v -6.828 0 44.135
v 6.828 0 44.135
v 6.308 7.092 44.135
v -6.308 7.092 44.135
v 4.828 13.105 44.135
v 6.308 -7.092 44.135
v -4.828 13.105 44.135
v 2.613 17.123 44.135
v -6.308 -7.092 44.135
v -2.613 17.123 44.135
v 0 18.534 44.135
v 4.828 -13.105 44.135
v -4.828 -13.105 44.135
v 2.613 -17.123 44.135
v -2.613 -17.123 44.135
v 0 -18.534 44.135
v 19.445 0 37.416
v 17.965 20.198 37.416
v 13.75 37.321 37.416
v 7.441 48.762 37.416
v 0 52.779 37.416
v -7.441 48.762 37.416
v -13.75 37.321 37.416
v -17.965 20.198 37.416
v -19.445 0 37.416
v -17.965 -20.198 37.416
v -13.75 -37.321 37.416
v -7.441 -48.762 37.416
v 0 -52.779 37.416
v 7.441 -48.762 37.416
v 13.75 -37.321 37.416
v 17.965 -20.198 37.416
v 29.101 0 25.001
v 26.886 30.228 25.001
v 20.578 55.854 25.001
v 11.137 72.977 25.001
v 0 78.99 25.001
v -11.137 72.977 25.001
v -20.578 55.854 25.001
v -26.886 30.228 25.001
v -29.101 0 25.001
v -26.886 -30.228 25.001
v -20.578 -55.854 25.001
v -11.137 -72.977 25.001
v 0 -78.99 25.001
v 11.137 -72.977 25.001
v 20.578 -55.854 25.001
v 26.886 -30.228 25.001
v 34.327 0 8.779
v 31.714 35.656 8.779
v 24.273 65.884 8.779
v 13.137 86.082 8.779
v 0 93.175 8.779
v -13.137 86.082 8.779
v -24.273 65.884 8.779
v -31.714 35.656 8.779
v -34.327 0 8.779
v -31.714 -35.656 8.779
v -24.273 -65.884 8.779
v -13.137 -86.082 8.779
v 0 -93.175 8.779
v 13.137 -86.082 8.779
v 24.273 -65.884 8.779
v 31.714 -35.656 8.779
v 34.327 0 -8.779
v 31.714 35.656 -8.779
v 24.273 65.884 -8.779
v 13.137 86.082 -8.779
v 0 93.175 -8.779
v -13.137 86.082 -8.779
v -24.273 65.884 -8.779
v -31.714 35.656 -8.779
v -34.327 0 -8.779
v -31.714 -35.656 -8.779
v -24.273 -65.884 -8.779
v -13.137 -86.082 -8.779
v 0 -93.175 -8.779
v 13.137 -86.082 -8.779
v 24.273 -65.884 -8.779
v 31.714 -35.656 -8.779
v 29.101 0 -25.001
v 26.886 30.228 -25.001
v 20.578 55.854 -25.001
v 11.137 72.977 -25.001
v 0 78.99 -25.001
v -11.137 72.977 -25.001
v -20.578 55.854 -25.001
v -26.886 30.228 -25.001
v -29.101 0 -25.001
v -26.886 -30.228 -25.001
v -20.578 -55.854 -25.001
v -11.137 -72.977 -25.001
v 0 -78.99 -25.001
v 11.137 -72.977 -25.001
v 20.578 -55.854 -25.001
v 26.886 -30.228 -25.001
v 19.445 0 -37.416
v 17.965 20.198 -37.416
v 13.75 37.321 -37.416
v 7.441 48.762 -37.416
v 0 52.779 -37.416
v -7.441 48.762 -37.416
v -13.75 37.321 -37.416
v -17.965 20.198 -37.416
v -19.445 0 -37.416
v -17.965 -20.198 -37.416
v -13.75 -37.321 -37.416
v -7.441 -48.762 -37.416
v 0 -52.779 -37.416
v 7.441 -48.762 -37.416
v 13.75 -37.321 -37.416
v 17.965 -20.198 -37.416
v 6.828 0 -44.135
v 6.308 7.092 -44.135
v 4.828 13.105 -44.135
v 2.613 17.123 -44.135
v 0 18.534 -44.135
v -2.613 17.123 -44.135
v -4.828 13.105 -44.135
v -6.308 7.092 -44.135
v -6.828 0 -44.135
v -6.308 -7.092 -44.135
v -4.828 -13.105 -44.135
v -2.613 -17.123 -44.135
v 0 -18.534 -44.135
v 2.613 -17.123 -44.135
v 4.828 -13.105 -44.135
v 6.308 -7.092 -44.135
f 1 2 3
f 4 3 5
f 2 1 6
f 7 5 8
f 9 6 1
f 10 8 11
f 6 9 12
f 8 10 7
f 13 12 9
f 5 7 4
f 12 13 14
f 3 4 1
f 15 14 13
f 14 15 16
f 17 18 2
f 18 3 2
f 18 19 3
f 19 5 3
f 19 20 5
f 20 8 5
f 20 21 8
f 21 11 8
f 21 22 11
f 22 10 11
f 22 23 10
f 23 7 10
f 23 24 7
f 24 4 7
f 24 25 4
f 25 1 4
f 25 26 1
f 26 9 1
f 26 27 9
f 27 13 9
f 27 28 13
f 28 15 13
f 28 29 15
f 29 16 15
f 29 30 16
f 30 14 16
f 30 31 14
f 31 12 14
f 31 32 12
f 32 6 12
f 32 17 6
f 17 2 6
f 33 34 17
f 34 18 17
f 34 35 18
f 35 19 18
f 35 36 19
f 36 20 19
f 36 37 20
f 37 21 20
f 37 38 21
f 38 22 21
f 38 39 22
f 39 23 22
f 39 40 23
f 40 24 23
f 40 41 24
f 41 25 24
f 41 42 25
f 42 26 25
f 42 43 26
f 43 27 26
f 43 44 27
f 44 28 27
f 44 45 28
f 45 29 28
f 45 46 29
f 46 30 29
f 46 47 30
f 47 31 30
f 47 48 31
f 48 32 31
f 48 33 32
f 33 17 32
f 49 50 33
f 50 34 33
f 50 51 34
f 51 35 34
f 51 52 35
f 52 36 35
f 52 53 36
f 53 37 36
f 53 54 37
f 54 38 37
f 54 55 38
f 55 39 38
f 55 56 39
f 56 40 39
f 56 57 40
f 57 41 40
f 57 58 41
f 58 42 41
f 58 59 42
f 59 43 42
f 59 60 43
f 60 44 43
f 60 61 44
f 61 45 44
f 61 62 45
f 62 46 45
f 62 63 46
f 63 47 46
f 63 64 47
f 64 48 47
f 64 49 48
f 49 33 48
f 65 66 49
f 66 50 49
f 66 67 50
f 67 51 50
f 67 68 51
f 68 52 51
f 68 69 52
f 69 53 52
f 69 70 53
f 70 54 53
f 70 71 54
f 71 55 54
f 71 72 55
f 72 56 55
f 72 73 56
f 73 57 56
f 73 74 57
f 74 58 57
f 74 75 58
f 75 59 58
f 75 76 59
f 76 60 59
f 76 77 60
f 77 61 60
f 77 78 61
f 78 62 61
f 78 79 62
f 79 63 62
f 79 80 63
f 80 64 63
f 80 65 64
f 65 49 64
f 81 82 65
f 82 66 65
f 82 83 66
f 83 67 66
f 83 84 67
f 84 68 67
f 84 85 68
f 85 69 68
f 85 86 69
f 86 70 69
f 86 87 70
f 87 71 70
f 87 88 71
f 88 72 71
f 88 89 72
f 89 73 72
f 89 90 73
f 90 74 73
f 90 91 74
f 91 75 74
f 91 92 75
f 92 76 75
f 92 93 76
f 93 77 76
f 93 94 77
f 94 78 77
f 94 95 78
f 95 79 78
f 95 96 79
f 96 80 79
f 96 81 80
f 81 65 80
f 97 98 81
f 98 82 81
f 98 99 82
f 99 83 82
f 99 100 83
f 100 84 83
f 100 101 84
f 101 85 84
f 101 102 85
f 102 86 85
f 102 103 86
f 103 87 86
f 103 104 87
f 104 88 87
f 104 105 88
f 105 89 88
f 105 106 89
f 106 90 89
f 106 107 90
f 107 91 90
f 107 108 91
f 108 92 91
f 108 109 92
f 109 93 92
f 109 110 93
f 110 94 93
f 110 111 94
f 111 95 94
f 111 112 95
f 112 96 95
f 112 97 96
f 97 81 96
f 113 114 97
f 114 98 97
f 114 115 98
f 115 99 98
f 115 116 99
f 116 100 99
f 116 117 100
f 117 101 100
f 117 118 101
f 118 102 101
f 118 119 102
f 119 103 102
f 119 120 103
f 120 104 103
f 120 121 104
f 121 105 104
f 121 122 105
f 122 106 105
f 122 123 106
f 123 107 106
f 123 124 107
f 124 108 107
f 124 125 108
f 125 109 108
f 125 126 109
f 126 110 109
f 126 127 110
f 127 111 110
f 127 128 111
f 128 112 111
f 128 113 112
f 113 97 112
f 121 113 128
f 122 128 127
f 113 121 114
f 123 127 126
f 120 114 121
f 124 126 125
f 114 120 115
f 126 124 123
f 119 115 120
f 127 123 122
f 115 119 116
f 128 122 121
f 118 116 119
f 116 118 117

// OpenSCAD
// Generated by SolidPython 1.0.1 on 2020-07-29 00:46:48


scale(v = [7, 19, 9]) {
	sphere(r = 5);
}
/***********************************************
*********      SolidPython code:      **********
************************************************
 
# import packages: SolidPython
from solid import *
from solid.utils import *
from itertools import chain, combinations, permutations


class Resize:

    def __init__(self, scad_file):
        self.scad_file = scad_file
        #self.scad_file = import_scad(scad_file)
        # cone/cylinder param:
        self.r1 = 0
        self.r2 = 0
        self.h = 0
        # rectangular prism param:
        self.w = 0
        self.l = 0
        # ellipse param:
        self.r = 0

    # import OpenScad code (file name corresponds to shape)


    # classify shape + parameters
    def assign(self, param1, param2, param3):
        if self.scad_file == 'cone.scad':
            self.r1 = param1
            self.r2 = param2
            self.h = param3
        elif self.scad_file == 'cylinder.scad':
            self.r1 = param1
            self.r2 = param2
            self.h = param3
        elif self.scad_file == 'rectangularPrism.scad':
            self.h = param1
            self.l = param2
            self.w = param3
        else:
            self.r = param1
            self.h = param2

    # resize parameters
    def iterate(self):
        x = range(3, 20, 2)
        i = 1
        if self.scad_file == 'cone.scad':
            tempList = list(permutations(x, 2))
            for temp in tempList:
                param1 = temp[0]
                param2 = temp[1]
                filepath = 'produced_scad_files/' + 'cone' + str(param1) + '_' + str(param2) + '_' + '.scad'
                scad_render_to_file(cylinder(h=param1, r1=param2, r2=0), filepath)

        elif self.scad_file == 'cylinder.scad':
            tempList = list(permutations(x, 3))
            for temp in tempList:
                param1 = temp[0]
                param2 = temp[1]
                filepath = 'produced_scad_files/' + 'cylinder' + str(param1) + '_' + str(param2) + '_' + '.scad'
                scad_render_to_file(cylinder(h=param1, r1=param2, r2=param2), filepath)

        elif self.scad_file == 'rectangularPrism.scad':
            tempList = list(permutations(x, 3))
            for temp in tempList:
                param1 = temp[0]
                param2 = temp[1]
                param3 = temp[2]
                filepath = 'produced_scad_files/' + 'rectangularPrism' + str(param1) + '_' + str(param2) + '_' + str(
                    param3) + '.scad'
                scad_render_to_file(cube(size=(param1, param2, param3)), filepath)

        elif self.scad_file == 'ellipse.scad':
            tempList = list(permutations(x, 4))
            for temp in tempList:
                param1 = temp[0]
                param2 = temp[1]
                param3 = temp[2]
                param4 = temp[3]
                filepath = 'produced_scad_files/' + 'ellipse' + str(param1) + '_' + str(param2) + '_' + str(param3) + '_' + str(param4) + '.scad'
                scad_render_to_file(scale([param1, param2, param3])(sphere(r=param4)), filepath)

    def render_to_scadfile(self):
        scad_render_to_file(scad, 'example.scad') 
 
************************************************/
